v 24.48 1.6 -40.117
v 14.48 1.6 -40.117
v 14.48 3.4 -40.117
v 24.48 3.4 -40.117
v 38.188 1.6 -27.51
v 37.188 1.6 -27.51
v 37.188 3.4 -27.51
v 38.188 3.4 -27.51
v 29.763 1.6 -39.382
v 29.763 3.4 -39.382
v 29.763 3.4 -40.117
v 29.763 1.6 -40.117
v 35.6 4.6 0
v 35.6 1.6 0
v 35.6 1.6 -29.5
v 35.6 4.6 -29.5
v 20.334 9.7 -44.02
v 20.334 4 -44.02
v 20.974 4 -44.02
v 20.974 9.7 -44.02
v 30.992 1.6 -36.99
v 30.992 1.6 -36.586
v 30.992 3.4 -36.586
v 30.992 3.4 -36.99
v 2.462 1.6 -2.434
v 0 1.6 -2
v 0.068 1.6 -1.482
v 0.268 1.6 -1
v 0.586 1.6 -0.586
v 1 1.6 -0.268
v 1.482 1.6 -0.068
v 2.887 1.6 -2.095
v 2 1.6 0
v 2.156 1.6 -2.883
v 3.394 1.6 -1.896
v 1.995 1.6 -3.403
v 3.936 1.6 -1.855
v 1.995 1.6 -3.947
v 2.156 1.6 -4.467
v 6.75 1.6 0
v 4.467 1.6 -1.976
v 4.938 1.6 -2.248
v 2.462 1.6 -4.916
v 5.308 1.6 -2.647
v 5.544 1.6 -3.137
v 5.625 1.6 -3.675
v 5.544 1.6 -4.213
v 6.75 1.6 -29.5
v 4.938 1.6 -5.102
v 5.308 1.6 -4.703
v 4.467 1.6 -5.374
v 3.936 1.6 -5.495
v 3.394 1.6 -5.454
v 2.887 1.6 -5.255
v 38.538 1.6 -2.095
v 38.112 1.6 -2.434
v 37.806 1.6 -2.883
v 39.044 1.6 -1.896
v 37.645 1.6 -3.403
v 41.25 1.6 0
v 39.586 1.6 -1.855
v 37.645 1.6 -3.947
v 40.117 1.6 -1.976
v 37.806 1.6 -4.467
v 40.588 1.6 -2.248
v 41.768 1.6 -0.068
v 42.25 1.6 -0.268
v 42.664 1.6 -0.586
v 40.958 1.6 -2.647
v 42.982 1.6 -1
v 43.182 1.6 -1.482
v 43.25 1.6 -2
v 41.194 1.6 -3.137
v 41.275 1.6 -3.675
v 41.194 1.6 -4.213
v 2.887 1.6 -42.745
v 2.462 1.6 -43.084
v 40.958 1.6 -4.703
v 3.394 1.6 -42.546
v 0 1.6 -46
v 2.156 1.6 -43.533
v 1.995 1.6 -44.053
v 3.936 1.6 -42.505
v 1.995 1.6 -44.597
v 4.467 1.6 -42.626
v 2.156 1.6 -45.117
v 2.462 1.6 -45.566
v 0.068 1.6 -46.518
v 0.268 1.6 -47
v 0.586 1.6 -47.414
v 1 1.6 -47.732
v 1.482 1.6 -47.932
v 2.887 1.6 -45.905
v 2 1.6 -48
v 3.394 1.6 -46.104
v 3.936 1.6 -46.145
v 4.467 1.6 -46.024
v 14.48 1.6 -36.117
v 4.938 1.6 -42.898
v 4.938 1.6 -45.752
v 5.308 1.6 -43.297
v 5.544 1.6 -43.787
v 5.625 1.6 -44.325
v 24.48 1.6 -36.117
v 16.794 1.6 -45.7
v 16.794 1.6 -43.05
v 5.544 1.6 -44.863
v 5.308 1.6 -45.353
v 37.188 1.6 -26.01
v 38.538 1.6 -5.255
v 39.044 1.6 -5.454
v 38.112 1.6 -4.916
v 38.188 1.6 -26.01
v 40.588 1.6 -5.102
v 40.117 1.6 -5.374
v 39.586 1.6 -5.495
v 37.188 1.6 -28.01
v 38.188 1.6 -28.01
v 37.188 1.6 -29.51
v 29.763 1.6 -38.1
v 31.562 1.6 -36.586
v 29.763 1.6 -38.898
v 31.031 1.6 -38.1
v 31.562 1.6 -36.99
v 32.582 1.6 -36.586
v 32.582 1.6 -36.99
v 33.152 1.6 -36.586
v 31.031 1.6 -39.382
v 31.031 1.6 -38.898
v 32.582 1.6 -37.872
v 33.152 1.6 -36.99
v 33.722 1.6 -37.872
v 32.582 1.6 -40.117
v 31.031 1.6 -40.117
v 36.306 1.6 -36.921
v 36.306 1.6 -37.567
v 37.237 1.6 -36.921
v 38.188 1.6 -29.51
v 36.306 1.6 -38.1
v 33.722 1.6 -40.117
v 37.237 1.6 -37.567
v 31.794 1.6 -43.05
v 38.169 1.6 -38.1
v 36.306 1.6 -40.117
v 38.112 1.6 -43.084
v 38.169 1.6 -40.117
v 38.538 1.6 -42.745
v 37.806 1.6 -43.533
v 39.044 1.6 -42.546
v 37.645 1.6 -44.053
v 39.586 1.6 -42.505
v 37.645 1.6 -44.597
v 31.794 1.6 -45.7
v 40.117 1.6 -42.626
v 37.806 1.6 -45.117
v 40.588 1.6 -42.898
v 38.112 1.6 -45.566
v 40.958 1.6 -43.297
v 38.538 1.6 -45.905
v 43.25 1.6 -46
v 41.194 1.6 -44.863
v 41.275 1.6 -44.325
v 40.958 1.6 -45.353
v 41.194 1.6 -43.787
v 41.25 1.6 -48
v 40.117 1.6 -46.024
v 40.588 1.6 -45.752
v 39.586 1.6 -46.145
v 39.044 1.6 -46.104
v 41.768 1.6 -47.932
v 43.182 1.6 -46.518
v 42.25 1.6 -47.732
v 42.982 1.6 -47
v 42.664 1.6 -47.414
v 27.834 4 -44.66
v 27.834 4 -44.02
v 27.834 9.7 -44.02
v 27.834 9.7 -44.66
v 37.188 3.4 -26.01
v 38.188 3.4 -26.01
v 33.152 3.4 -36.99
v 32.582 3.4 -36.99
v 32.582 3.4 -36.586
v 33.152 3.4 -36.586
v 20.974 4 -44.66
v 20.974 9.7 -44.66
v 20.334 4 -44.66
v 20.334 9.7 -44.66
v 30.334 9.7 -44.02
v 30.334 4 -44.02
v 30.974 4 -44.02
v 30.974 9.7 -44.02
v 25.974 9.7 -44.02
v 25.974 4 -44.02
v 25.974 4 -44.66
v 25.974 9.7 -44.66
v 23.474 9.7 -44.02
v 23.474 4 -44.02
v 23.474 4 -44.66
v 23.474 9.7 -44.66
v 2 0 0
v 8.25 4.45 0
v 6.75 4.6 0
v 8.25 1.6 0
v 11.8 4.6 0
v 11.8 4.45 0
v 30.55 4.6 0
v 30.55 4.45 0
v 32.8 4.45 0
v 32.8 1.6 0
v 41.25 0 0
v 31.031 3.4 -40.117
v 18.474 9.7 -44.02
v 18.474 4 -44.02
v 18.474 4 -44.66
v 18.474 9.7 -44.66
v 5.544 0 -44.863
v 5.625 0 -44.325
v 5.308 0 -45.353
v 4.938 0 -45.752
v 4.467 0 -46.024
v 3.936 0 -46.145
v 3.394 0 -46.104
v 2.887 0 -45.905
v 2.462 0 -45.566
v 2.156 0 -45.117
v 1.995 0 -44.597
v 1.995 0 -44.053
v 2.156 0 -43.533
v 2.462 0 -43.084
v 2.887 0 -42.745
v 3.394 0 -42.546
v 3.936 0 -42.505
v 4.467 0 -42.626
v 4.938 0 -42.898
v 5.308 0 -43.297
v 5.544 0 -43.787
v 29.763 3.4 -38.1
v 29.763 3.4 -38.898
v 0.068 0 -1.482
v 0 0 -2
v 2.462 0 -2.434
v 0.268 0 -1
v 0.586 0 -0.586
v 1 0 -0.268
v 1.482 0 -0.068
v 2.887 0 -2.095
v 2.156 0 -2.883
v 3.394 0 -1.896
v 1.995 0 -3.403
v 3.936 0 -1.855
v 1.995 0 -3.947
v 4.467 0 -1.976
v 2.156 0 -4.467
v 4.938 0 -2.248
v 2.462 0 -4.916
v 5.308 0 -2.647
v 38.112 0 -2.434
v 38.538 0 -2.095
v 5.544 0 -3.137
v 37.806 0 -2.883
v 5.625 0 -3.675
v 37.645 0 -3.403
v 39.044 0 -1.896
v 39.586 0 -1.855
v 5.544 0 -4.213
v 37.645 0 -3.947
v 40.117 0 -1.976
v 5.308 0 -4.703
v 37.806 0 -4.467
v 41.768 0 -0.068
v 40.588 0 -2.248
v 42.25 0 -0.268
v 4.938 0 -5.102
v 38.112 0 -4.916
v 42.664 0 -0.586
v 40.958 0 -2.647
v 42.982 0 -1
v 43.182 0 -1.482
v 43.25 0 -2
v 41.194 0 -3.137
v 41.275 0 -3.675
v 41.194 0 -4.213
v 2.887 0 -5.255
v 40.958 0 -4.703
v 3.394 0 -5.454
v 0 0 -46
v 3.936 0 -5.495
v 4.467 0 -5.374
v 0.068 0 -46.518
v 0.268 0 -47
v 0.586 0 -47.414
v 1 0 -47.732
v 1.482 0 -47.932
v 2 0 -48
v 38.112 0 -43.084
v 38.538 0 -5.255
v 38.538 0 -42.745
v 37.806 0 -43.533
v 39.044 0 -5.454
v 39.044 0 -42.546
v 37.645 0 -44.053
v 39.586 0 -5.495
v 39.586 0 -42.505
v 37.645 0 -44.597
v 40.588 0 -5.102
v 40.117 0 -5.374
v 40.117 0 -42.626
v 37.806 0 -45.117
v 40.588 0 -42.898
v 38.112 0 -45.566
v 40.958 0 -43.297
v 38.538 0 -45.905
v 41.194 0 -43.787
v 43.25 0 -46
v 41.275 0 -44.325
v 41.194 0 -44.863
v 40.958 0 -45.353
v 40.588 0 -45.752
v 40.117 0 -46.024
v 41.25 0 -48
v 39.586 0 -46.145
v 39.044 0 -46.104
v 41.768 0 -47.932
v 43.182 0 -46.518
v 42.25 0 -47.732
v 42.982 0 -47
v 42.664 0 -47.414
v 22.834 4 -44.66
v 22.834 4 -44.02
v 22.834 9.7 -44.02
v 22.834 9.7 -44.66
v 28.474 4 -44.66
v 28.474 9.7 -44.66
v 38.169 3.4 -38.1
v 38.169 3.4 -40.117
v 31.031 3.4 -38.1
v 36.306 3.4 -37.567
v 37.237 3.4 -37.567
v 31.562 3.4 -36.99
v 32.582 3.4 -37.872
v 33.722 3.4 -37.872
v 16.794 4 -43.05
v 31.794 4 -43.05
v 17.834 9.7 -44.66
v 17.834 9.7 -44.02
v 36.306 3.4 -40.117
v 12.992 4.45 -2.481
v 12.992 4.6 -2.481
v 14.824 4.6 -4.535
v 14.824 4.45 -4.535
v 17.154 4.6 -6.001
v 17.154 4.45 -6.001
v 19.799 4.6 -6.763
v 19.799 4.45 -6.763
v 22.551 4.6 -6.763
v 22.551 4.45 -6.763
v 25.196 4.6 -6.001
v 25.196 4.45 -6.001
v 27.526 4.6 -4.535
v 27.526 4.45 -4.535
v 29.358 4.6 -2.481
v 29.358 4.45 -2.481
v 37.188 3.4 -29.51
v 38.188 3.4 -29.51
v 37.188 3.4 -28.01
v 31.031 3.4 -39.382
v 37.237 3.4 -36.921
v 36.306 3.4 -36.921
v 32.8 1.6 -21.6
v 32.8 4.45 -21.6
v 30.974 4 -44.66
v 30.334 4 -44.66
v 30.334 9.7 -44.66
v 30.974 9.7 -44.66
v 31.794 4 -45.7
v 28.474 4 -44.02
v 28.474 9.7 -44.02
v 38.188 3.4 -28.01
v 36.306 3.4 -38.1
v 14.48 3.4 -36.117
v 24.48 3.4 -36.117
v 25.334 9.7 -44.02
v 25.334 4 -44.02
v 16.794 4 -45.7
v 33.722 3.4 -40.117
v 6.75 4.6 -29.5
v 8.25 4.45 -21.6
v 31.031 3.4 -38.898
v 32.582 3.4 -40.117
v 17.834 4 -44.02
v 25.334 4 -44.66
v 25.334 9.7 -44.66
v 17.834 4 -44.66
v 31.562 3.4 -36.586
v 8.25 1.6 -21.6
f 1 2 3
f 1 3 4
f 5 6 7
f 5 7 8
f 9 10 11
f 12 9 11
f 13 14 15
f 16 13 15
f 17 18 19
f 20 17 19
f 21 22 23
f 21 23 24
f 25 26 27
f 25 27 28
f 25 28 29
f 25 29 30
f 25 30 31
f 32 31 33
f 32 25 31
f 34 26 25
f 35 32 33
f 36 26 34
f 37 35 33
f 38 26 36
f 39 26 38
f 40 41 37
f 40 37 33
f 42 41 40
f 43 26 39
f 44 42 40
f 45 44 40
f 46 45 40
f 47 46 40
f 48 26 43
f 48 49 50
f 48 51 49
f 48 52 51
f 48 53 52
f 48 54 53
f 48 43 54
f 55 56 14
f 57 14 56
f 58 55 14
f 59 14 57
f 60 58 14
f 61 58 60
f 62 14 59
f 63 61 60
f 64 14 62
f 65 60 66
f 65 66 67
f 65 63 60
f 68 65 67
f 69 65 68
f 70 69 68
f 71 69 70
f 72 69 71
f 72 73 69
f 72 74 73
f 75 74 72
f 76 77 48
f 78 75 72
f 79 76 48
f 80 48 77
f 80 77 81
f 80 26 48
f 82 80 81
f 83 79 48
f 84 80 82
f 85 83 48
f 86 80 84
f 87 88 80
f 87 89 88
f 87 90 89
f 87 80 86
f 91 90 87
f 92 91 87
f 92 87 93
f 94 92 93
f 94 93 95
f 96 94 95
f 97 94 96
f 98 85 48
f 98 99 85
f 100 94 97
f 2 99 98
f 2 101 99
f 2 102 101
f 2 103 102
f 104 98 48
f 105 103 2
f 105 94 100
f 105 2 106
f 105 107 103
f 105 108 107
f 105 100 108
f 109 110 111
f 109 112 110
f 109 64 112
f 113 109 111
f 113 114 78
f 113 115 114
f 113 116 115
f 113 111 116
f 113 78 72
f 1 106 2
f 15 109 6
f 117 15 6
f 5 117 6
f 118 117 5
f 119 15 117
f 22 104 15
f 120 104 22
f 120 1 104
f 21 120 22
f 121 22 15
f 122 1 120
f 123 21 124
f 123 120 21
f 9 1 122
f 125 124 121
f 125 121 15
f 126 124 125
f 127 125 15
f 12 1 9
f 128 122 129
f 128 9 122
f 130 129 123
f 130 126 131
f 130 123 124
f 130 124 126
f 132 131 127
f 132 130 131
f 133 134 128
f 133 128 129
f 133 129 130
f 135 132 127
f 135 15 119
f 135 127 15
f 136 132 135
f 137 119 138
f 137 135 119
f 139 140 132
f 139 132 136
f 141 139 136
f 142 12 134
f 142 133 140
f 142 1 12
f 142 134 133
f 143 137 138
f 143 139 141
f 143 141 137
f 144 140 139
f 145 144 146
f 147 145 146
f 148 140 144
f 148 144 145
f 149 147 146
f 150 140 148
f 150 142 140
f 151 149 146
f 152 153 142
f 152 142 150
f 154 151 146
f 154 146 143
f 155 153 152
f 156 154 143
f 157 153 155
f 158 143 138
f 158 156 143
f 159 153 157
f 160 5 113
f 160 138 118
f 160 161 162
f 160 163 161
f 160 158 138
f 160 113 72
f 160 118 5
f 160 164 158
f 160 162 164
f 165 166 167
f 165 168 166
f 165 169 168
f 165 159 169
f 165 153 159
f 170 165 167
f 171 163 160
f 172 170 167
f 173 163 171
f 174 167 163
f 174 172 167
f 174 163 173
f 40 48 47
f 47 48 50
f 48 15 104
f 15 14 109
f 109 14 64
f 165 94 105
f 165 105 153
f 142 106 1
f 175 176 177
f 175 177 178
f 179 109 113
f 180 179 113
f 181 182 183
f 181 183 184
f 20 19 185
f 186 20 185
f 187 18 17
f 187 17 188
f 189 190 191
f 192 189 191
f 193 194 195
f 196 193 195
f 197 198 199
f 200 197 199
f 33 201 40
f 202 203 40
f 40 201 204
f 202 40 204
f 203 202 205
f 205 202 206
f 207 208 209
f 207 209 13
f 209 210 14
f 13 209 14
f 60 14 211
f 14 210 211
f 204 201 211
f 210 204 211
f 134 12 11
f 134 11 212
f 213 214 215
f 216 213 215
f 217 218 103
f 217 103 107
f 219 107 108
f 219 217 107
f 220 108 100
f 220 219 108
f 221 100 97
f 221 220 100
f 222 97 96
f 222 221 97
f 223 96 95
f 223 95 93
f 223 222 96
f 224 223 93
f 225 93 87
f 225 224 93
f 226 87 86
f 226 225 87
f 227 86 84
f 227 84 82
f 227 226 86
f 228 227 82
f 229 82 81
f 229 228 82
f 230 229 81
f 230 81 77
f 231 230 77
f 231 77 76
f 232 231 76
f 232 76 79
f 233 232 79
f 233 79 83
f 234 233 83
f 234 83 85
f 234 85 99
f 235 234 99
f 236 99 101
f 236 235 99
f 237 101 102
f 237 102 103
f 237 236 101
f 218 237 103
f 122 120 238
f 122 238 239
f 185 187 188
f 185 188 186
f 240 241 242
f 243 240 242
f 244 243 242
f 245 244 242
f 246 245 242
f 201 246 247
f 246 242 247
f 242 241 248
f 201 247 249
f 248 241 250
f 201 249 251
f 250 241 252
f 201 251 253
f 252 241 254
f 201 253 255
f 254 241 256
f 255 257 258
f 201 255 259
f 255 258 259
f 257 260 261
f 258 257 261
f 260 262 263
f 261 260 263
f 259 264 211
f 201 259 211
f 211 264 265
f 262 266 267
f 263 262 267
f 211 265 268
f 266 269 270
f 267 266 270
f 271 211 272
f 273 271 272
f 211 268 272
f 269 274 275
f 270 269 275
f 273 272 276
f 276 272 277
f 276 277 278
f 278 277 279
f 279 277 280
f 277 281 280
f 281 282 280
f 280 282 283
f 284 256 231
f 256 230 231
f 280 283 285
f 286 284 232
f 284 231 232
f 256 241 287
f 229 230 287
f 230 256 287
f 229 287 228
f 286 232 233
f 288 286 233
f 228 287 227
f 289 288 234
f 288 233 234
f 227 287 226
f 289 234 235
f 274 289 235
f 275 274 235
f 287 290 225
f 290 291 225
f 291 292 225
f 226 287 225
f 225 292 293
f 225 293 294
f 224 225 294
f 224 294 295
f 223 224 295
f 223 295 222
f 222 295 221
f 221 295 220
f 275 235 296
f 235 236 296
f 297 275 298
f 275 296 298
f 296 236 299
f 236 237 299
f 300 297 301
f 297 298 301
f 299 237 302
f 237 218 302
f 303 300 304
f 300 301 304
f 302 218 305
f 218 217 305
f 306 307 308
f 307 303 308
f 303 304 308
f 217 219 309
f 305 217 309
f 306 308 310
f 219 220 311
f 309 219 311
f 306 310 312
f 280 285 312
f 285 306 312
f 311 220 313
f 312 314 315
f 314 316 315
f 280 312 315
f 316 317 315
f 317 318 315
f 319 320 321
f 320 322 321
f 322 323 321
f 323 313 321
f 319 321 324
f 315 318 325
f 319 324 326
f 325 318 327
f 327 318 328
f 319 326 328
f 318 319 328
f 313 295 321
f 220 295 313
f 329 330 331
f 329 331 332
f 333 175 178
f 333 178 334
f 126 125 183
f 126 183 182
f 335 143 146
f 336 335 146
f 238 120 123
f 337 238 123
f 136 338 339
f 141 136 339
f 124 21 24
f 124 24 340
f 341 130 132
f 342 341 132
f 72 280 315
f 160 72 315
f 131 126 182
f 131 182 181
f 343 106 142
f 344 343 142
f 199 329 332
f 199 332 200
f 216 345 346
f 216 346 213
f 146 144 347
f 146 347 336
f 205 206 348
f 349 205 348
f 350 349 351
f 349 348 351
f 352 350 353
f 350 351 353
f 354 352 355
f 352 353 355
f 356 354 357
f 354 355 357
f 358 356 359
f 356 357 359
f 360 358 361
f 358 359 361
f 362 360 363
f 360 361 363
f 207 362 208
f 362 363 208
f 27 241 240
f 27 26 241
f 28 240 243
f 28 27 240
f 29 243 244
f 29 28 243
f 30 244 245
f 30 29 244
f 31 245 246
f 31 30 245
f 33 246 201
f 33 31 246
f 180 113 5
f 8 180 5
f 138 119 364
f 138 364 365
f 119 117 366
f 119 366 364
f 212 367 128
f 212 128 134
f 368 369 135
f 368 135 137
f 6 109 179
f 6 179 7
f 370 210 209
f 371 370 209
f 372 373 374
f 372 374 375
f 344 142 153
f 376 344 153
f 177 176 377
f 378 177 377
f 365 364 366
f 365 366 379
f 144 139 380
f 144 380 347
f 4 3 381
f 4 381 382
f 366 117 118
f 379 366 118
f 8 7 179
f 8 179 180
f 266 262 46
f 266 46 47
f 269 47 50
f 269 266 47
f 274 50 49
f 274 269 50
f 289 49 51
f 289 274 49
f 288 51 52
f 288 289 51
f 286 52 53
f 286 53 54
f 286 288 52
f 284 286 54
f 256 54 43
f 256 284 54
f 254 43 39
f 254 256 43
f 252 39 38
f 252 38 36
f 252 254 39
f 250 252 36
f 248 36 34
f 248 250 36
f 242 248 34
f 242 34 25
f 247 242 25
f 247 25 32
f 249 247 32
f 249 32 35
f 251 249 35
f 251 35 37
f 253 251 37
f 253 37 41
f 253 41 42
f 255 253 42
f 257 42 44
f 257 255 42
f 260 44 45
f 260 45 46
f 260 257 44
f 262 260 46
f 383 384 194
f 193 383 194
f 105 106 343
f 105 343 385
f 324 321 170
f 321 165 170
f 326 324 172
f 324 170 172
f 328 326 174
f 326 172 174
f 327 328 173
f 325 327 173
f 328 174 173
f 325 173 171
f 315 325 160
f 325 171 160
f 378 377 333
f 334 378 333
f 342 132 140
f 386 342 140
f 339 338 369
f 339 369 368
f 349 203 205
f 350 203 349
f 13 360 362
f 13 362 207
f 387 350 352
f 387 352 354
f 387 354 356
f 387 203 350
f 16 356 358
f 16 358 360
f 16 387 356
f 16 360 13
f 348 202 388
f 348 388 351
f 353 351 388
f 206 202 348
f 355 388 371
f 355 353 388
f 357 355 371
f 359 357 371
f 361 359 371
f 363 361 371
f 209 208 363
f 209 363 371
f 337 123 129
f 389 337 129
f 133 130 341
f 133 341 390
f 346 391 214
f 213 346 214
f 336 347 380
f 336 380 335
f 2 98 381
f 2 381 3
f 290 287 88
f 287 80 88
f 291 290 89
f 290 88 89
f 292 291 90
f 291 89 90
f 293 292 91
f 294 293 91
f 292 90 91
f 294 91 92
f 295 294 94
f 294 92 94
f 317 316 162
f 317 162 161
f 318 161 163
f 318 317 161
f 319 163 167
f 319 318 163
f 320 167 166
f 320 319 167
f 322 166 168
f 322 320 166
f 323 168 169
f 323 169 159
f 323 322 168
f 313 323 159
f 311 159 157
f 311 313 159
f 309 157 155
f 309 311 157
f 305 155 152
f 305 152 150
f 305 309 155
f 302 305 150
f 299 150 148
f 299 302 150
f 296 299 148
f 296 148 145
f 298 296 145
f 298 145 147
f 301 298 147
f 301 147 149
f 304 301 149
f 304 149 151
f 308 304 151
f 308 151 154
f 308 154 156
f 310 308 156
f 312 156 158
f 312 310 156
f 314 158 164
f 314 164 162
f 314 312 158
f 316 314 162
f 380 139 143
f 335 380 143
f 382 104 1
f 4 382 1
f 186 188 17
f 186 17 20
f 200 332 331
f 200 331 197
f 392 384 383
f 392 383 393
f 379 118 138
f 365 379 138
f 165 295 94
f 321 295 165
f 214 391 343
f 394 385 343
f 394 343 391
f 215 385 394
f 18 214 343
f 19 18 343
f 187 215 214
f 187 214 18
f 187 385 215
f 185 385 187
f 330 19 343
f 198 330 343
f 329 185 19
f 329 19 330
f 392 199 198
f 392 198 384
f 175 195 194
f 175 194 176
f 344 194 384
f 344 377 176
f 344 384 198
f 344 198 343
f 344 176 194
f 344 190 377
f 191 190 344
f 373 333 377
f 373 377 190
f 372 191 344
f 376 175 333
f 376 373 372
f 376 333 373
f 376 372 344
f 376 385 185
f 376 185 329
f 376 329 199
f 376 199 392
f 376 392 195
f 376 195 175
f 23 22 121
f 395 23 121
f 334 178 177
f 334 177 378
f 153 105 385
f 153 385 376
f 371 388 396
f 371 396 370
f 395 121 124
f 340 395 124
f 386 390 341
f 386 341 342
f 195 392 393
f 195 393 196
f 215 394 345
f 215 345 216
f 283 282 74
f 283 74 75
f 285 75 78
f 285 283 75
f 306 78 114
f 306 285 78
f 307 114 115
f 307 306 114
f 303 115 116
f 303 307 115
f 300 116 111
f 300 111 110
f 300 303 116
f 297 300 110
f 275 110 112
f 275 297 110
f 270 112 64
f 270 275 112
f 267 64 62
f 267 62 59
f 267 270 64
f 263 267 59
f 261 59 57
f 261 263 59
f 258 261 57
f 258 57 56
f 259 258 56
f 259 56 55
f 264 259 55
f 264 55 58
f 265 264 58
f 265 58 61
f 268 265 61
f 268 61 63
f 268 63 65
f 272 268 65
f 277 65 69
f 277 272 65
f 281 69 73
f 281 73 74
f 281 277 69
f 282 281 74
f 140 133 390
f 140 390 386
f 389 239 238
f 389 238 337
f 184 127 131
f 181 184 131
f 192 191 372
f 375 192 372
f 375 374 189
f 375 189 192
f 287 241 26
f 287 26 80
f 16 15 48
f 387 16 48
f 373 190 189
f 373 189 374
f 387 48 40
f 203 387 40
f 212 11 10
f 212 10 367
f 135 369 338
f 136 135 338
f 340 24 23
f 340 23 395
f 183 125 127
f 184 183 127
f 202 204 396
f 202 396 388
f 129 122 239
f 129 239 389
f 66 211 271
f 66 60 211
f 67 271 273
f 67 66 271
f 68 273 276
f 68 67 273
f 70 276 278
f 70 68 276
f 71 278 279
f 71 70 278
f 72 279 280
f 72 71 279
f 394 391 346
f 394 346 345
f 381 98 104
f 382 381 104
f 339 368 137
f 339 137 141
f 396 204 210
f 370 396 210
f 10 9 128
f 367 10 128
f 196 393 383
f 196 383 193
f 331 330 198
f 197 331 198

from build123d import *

# Parameters (mm, degrees)
SKETCH1_W               = 43.25
SKETCH1_H               = 48
SKETCH1_R               = 1.825
BOSS_EXTRUDE1_DEPTH     = 1.6
BOSS_EXTRUDE2_DEPTH     = 3
SKETCH3_W               = 24.55
SKETCH3_H               = 2.85
CUT_EXTRUDE1_DEPTH      = 21.6
SKETCH5_W               = 15
SKETCH5_H               = 2.65
BOSS_EXTRUDE4_DEPTH     = 2.4
SKETCH6_W               = 0.64
SKETCH6_H               = 0.64
BOSS_EXTRUDE5_DEPTH     = 5.7
FILLET1_R               = 2
CROQUIS1_W              = 1
CROQUIS1_H              = 1.5
CROQUIS1_W_2            = 10
CROQUIS1_H_2            = 4
CROQUIS1_W_3            = 1.267972753
CROQUIS1_H_3            = 0.734089488
CROQUIS1_H_4            = 0.798121905
CROQUIS1_W_4            = 1.14017415
CROQUIS1_H_5            = 2.245070142
CROQUIS1_W_5            = 1.862284445
CROQUIS1_H_6            = 2.017035312
CROQUIS1_W_6            = 0.931142223
CROQUIS1_H_7            = 0.646098685
CROQUIS1_W_7            = 0.570576299
CROQUIS1_H_8            = 0.403366405
SALIENTE_EXTRUIR1_DEPTH = 1.8


with BuildPart() as part:
    # Sketch1 → Boss-Extrude1 (new body)
    with BuildSketch(Plane(origin=(0, 0, 0), x_dir=(1, 0, 0), z_dir=(0, 1, 0))):
        with Locations((21.625, 24)):
            Rectangle(SKETCH1_W, SKETCH1_H)
        with Locations((3.8, 44.325)):
            Circle(SKETCH1_R, mode=Mode.SUBTRACT)
        with Locations((3.8, 3.675)):
            Circle(SKETCH1_R, mode=Mode.SUBTRACT)
        with Locations((39.45, 44.325)):
            Circle(SKETCH1_R, mode=Mode.SUBTRACT)
        with Locations((39.45, 3.675)):
            Circle(SKETCH1_R, mode=Mode.SUBTRACT)
    extrude(amount=BOSS_EXTRUDE1_DEPTH)

    # Sketch2 → Boss-Extrude2 (add)
    with BuildSketch(Plane(origin=(0, 1.6, 0), x_dir=(1, 0, 0), z_dir=(0, 1, 0))):
        with BuildLine():
            Line((6.75, 0), (11.8, 0))
            ThreePointArc((11.8, 0), (21.175, 6.86), (30.55, 0))
            Line((30.55, 0), (35.6, 0))
            Line((35.6, 0), (35.6, 29.5))
            Line((35.6, 29.5), (6.75, 29.5))
            Line((6.75, 29.5), (6.75, 0))
        make_face()
    extrude(amount=BOSS_EXTRUDE2_DEPTH)

    # Sketch3 → Cut-Extrude1 (cut)
    with BuildSketch(Plane.XY):
        with Locations((20.525, 3.025)):
            Rectangle(SKETCH3_W, SKETCH3_H)
    extrude(amount=-CUT_EXTRUDE1_DEPTH, mode=Mode.SUBTRACT)

    # Sketch5 → Boss-Extrude4 (add)
    with BuildSketch(Plane(origin=(0, 1.6, 0), x_dir=(1, 0, 0), z_dir=(0, 1, 0))):
        with Locations((24.293988912, 44.375)):
            Rectangle(SKETCH5_W, SKETCH5_H)
    extrude(amount=BOSS_EXTRUDE4_DEPTH)

    # Sketch6 → Boss-Extrude5 (add)
    with BuildSketch(Plane(origin=(0, 4, 0), x_dir=(1, 0, 0), z_dir=(0, 1, 0))):
        with Locations((18.153988912, 44.34)):
            Rectangle(SKETCH6_W, SKETCH6_H)
        with Locations((20.653988912, 44.34)):
            Rectangle(SKETCH6_W, SKETCH6_H)
        with Locations((23.153988912, 44.34)):
            Rectangle(SKETCH6_W, SKETCH6_H)
        with Locations((25.653988912, 44.34)):
            Rectangle(SKETCH6_W, SKETCH6_H)
        with Locations((28.153988912, 44.34)):
            Rectangle(SKETCH6_W, SKETCH6_H)
        with Locations((30.653988912, 44.34)):
            Rectangle(SKETCH6_W, SKETCH6_H)
    extrude(amount=BOSS_EXTRUDE5_DEPTH)

    # Fillet1
    fillet1_edges = [part.edges().sort_by_distance(p)[0] for p in [
        (0, 0.8, 0),
        (43.25, 0.8, 0),
        (43.25, 0.8, -48),
        (0, 0.8, -48),
    ]]
    fillet(fillet1_edges, radius=FILLET1_R)

    # Croquis1 → Saliente-Extruir1 (add)
    with BuildSketch(Plane(origin=(0, 1.6, 0), x_dir=(1, 0, 0), z_dir=(0, 1, 0))):
        with Locations((37.688468842, 26.759910401)):
            Rectangle(CROQUIS1_W, CROQUIS1_H)
        with Locations((19.480186858, 38.116576041)):
            Rectangle(CROQUIS1_W_2, CROQUIS1_H_2)
        with Locations((30.396581675, 39.749531297)):
            Rectangle(CROQUIS1_W_3, CROQUIS1_H_3)
        with Locations((30.396581675, 38.498601682)):
            Rectangle(CROQUIS1_W_3, CROQUIS1_H_4)
        with Locations((33.151840343, 38.99404097)):
            Rectangle(CROQUIS1_W_4, CROQUIS1_H_5)
        with Locations((37.237464381, 39.108058385)):
            Rectangle(CROQUIS1_W_5, CROQUIS1_H_6)
        with Locations((36.771893269, 37.244410117)):
            Rectangle(CROQUIS1_W_6, CROQUIS1_H_7)
        with Locations((32.867041418, 36.787844886)):
            Rectangle(CROQUIS1_W_7, CROQUIS1_H_8)
        with Locations((37.688468842, 28.759910401)):
            Rectangle(CROQUIS1_W, CROQUIS1_H)
        with Locations((31.277047992, 36.787844886)):
            Rectangle(CROQUIS1_W_7, CROQUIS1_H_8)
    extrude(amount=SALIENTE_EXTRUIR1_DEPTH)


solid = part.part
